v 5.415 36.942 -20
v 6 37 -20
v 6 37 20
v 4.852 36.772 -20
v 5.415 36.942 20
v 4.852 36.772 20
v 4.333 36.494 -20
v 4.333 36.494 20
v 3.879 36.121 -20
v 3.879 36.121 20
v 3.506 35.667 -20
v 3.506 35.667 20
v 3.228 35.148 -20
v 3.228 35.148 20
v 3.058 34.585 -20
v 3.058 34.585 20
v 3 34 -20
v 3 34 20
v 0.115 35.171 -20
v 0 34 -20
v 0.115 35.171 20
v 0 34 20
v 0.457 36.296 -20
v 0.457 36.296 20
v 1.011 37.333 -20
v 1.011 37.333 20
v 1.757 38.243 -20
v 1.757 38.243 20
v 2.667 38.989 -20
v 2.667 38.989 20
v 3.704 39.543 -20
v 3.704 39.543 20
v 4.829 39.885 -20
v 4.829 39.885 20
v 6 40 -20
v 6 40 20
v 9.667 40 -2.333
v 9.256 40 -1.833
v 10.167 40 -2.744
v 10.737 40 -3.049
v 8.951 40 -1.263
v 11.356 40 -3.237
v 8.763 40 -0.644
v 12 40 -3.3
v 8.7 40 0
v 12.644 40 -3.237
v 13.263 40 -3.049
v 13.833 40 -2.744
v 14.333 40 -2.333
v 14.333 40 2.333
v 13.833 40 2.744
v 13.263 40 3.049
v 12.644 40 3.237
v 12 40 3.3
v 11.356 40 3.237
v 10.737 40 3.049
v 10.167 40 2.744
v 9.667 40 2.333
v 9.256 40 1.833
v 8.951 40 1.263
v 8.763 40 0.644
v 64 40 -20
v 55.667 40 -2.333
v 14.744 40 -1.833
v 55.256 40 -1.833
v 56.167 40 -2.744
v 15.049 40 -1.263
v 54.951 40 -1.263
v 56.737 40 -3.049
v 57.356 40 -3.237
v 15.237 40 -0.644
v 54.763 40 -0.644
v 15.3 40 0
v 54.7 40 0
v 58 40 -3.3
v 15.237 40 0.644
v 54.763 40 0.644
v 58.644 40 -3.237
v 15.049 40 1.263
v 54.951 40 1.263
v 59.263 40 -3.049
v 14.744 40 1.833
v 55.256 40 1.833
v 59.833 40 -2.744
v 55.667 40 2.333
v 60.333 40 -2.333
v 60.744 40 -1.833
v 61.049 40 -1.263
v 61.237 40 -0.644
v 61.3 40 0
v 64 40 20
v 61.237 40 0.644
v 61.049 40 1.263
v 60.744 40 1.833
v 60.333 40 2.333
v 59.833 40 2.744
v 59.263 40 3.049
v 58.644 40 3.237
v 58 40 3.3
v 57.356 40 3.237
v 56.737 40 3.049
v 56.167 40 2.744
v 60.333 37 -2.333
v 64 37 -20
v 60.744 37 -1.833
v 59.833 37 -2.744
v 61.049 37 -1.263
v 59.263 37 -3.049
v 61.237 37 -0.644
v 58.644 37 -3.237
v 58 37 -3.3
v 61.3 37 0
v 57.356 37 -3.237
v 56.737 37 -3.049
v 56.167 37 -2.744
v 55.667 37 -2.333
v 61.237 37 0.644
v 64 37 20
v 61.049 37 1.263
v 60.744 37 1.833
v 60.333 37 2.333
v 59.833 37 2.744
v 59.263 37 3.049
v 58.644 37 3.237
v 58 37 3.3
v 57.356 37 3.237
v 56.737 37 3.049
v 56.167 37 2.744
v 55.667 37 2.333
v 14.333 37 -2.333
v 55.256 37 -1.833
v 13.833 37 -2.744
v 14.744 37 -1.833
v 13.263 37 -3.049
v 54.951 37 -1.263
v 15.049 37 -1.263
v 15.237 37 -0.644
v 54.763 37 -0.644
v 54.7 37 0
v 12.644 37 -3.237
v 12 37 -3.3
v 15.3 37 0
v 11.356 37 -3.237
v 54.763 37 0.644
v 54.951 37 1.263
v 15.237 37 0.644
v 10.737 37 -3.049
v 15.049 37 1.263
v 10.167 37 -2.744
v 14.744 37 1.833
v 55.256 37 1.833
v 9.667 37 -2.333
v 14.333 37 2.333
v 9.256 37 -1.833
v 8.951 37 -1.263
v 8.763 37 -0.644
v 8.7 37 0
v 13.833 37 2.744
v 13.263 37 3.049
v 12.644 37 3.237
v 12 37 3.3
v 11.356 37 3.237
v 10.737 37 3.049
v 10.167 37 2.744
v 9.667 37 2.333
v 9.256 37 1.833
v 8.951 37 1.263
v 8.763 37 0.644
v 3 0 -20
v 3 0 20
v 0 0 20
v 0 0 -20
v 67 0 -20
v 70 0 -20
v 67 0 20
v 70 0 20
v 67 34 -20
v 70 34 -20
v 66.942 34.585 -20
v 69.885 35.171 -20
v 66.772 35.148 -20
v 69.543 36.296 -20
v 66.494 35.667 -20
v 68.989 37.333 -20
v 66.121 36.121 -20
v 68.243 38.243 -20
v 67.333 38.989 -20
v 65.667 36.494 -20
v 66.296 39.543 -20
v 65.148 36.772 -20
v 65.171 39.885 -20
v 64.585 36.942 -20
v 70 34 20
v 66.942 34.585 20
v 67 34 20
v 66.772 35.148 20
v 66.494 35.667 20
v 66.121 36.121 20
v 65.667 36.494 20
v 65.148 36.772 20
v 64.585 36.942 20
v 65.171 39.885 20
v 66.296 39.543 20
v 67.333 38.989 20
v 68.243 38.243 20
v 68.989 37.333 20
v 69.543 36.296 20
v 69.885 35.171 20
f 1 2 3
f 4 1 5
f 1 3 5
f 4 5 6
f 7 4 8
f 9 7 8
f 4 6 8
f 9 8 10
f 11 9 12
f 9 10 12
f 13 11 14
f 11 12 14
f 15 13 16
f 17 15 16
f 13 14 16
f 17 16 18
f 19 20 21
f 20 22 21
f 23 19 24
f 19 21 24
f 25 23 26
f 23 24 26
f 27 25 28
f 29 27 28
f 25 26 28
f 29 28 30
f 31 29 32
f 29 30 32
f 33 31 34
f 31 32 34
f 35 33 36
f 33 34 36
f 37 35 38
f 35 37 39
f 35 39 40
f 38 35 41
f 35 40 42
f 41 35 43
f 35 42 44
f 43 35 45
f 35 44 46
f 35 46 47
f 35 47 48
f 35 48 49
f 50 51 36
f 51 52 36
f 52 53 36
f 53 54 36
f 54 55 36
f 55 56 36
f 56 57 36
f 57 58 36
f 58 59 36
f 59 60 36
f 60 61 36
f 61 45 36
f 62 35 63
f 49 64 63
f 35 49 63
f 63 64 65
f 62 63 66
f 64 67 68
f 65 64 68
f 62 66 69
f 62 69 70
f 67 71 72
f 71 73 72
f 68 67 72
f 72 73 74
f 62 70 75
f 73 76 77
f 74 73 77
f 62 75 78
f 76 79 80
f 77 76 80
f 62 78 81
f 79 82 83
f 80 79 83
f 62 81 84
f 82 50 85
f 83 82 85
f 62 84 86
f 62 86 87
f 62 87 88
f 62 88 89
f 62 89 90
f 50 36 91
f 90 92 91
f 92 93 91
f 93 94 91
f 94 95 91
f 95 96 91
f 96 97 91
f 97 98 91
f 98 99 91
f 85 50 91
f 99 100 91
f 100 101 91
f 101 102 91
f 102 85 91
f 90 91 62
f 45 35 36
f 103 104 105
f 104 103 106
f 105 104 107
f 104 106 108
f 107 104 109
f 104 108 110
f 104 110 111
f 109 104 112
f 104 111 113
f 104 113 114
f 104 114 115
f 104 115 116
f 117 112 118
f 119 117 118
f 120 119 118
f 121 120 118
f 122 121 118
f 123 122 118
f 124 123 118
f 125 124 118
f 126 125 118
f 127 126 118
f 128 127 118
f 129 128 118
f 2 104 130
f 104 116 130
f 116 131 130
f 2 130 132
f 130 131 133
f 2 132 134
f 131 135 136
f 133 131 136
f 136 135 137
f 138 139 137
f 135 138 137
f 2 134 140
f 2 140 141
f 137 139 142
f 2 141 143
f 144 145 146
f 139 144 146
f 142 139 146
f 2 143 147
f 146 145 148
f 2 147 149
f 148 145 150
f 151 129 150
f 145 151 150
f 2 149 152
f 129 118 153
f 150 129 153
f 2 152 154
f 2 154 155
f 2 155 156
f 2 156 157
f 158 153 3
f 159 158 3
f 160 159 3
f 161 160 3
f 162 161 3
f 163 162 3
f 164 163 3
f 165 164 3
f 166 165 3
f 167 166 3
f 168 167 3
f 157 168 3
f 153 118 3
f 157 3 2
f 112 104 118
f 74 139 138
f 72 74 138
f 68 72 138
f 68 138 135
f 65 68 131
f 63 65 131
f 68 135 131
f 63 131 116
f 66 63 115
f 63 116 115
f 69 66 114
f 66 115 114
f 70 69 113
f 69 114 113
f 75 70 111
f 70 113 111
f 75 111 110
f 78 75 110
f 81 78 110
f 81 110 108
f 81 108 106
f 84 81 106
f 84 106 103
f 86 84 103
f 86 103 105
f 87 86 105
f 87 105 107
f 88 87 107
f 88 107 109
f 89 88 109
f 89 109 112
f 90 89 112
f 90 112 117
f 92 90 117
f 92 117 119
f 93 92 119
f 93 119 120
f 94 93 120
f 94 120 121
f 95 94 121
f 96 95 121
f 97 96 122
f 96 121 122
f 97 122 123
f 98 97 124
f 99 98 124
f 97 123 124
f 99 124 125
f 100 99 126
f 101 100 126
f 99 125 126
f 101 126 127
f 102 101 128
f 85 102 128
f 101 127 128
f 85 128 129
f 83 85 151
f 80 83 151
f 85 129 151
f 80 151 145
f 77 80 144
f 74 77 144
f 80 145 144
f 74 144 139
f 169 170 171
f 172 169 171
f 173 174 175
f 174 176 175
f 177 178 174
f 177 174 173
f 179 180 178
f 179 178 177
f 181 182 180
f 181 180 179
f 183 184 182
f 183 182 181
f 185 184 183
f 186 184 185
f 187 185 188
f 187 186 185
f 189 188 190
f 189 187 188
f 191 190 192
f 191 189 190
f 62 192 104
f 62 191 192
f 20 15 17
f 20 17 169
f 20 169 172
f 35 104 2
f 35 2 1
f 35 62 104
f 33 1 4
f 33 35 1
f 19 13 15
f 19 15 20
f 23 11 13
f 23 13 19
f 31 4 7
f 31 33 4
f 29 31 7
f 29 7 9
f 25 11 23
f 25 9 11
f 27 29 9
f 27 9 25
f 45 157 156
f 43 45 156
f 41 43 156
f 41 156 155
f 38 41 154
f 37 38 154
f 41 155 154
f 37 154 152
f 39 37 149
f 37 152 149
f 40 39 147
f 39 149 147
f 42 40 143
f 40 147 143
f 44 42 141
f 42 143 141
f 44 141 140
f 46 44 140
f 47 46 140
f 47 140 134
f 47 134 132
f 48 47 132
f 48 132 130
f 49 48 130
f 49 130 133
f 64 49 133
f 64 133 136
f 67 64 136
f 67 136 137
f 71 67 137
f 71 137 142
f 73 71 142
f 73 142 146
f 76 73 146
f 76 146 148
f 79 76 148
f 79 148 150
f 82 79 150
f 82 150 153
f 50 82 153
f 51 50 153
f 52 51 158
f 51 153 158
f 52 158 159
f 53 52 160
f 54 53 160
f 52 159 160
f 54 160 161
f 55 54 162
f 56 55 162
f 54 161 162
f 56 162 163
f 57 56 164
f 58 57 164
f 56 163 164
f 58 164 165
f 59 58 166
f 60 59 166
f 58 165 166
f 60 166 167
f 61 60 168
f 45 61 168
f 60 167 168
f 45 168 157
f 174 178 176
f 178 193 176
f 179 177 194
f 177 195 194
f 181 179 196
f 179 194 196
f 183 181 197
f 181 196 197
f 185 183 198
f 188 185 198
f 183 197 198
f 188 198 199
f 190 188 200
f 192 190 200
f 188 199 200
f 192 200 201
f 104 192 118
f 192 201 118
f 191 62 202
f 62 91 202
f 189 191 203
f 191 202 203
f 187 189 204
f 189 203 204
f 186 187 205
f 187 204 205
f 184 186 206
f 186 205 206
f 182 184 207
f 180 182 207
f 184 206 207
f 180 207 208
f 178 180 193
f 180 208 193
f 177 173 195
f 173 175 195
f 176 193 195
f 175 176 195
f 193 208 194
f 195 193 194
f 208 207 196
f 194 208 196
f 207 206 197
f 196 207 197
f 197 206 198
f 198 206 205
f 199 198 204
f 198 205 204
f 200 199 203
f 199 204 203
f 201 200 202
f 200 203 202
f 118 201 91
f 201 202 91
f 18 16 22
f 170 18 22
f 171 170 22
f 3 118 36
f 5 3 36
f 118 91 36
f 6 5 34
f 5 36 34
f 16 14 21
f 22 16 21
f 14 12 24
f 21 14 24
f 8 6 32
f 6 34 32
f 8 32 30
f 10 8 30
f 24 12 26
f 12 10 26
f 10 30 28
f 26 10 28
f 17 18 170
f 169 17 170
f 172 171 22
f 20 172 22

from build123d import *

# Parameters (mm, degrees)
SM_BASE_FLANGE_1_DEPTH  = 20
HOLE_WIZARD_6_6_6_6_1_D = 6.6


# Sheet-metal steps are written as plain solids
with BuildPart() as part:
    # Sketch 1 → Базовая кромка1 (new, symmetric)
    with BuildSketch(Plane.XY):
        with BuildLine():
            Line((0, 0), (0, 34))
            ThreePointArc((0, 34), (1.757359313, 38.242640687), (6, 40))
            Line((6, 40), (64, 40))
            ThreePointArc((64, 40), (68.242640687, 38.242640687), (70, 34))
            Line((70, 34), (70, 0))
            Line((70, 0), (67, 0))
            Line((67, 0), (67, 34))
            ThreePointArc((67, 34), (66.121320344, 36.121320344), (64, 37))
            Line((64, 37), (6, 37))
            ThreePointArc((6, 37), (3.878679656, 36.121320344), (3, 34))
            Line((3, 34), (3, 0))
            Line((3, 0), (0, 0))
        make_face()
    extrude(amount=SM_BASE_FLANGE_1_DEPTH, both=True)

    # Диаметр отверстия Ø6.6 (6.6)1 (through all)
    with Locations(Plane(origin=(0, 40, 0), x_dir=(1, 0, 0), z_dir=(0, 1, 0))):
        with Locations((12, 0), (58, 0)):
            Hole(HOLE_WIZARD_6_6_6_6_1_D / 2)


solid = part.part
